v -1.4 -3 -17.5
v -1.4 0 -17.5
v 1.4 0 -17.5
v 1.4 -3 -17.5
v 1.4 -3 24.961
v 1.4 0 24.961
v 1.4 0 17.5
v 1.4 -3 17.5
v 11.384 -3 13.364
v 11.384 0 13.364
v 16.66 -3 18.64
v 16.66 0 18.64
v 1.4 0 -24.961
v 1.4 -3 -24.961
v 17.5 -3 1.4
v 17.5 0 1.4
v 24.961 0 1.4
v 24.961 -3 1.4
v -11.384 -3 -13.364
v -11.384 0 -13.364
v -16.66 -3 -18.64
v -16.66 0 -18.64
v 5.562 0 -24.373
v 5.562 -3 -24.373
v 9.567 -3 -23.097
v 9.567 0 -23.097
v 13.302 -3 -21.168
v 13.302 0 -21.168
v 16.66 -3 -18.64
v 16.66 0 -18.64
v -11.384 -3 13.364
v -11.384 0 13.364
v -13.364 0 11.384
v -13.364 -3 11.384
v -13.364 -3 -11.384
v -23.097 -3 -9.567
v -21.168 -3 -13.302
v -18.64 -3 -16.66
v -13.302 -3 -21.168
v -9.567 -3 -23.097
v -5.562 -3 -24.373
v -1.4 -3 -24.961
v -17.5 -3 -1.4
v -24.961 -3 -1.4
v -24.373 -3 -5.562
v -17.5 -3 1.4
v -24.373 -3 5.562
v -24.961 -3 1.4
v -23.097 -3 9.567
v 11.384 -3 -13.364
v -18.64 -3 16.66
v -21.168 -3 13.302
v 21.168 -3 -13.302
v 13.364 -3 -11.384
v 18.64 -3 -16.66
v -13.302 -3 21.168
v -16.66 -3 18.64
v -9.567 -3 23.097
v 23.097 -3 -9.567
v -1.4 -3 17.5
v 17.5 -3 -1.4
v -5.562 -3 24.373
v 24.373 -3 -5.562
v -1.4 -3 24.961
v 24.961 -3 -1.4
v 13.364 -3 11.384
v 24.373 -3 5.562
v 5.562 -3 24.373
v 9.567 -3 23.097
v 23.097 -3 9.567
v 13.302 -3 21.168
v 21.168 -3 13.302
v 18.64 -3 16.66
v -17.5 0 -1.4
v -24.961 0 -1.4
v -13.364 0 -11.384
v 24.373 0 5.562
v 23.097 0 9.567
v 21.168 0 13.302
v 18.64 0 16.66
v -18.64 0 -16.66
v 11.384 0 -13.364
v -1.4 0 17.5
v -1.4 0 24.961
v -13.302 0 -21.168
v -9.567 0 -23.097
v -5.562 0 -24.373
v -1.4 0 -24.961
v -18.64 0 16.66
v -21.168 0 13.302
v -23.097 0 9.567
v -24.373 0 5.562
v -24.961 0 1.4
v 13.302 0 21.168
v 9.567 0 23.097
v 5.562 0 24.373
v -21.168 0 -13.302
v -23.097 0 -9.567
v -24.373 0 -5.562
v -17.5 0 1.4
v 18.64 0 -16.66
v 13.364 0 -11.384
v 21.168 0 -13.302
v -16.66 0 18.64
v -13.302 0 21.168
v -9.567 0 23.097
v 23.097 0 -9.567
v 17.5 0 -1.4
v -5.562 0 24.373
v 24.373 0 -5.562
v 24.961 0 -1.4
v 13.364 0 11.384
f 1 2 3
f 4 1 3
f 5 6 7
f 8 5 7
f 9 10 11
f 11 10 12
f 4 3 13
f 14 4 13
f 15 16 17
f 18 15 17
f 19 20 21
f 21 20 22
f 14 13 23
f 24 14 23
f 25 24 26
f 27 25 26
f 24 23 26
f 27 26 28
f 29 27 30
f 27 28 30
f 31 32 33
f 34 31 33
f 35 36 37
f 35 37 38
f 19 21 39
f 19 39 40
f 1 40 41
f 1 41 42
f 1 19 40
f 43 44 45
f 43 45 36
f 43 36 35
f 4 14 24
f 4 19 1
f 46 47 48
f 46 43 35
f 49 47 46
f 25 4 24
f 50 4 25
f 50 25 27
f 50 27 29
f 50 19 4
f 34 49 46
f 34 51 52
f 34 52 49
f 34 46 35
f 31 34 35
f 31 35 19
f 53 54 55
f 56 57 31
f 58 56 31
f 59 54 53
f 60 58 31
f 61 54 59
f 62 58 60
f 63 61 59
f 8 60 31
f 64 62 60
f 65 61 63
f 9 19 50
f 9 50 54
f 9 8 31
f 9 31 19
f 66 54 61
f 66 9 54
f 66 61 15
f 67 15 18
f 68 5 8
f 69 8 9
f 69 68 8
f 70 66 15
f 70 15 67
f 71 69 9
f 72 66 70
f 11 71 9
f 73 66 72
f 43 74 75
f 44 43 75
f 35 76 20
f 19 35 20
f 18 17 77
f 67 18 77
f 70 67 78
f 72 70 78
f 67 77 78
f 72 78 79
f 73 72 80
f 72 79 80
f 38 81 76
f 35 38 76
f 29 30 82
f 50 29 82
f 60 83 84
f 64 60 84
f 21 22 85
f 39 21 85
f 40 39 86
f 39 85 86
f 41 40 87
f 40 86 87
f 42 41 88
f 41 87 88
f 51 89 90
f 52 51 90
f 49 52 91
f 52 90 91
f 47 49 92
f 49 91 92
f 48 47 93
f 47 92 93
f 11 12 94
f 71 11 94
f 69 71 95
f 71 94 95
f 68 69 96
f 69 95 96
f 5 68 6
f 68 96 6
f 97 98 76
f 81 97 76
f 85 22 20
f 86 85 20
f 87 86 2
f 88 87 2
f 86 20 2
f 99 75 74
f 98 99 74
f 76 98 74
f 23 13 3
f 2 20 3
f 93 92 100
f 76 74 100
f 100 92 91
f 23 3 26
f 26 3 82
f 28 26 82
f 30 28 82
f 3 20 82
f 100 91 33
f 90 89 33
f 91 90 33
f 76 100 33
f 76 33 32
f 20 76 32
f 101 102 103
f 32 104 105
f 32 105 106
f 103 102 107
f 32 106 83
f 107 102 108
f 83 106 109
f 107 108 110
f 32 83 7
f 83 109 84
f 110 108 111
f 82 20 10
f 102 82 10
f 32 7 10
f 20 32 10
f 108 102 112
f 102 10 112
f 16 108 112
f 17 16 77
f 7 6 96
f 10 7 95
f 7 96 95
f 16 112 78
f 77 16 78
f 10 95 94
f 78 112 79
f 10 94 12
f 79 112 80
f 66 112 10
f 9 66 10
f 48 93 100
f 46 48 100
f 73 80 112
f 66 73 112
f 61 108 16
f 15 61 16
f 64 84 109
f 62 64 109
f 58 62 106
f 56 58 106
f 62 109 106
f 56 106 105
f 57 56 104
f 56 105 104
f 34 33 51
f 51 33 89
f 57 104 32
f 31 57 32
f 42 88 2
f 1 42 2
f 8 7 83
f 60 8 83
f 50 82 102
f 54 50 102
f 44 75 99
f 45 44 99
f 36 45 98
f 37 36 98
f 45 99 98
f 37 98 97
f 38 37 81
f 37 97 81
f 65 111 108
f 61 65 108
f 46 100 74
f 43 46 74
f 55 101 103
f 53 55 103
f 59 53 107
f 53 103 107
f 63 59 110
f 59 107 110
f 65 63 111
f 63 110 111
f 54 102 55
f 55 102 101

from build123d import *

# Parameters (mm, degrees)
F1_DEPTH = 3


with BuildPart() as f1:
    # F0 (on Front) → F1 (new body)
    with BuildSketch(Plane.XZ):
        with BuildLine():
            Line((11.384419, 13.364318), (16.65998, 18.639879))
            ThreePointArc((16.65998, 18.639879), (9.567086, 23.096988), (1.4, 24.960769))
            Line((1.4, 24.960769), (1.4, 17.5))
            Line((1.4, 17.5), (-1.4, 17.5))
            Line((-1.4, 17.5), (-1.4, 24.960769))
            ThreePointArc((-1.4, 24.960769), (-9.567086, 23.096988), (-16.65998, 18.639879))
            Line((-16.65998, 18.639879), (-11.384419, 13.364318))
            Line((-11.384419, 13.364318), (-13.364318, 11.384419))
            Line((-13.364318, 11.384419), (-18.639879, 16.65998))
            ThreePointArc((-18.639879, 16.65998), (-23.096988, 9.567086), (-24.960769, 1.4))
            Line((-24.960769, 1.4), (-17.5, 1.4))
            Line((-17.5, 1.4), (-17.5, -1.4))
            Line((-17.5, -1.4), (-24.960769, -1.4))
            ThreePointArc((-24.960769, -1.4), (-23.096988, -9.567086), (-18.639879, -16.65998))
            Line((-18.639879, -16.65998), (-13.364318, -11.384419))
            Line((-13.364318, -11.384419), (-11.384419, -13.364318))
            Line((-11.384419, -13.364318), (-16.65998, -18.639879))
            ThreePointArc((-16.65998, -18.639879), (-9.567086, -23.096988), (-1.4, -24.960769))
            Line((-1.4, -24.960769), (-1.4, -17.5))
            Line((-1.4, -17.5), (1.4, -17.5))
            Line((1.4, -17.5), (1.4, -24.960769))
            ThreePointArc((1.4, -24.960769), (9.567086, -23.096988), (16.65998, -18.639879))
            Line((16.65998, -18.639879), (11.384419, -13.364318))
            Line((11.384419, -13.364318), (13.364318, -11.384419))
            Line((13.364318, -11.384419), (18.639879, -16.65998))
            ThreePointArc((18.639879, -16.65998), (23.096988, -9.567086), (24.960769, -1.4))
            Line((24.960769, -1.4), (17.5, -1.4))
            Line((17.5, -1.4), (17.5, 1.4))
            Line((17.5, 1.4), (24.960769, 1.4))
            ThreePointArc((24.960769, 1.4), (23.096988, 9.567086), (18.639879, 16.65998))
            Line((18.639879, 16.65998), (13.364318, 11.384419))
            Line((13.364318, 11.384419), (11.384419, 13.364318))
        make_face()
    extrude(amount=F1_DEPTH)


solid = f1.part
